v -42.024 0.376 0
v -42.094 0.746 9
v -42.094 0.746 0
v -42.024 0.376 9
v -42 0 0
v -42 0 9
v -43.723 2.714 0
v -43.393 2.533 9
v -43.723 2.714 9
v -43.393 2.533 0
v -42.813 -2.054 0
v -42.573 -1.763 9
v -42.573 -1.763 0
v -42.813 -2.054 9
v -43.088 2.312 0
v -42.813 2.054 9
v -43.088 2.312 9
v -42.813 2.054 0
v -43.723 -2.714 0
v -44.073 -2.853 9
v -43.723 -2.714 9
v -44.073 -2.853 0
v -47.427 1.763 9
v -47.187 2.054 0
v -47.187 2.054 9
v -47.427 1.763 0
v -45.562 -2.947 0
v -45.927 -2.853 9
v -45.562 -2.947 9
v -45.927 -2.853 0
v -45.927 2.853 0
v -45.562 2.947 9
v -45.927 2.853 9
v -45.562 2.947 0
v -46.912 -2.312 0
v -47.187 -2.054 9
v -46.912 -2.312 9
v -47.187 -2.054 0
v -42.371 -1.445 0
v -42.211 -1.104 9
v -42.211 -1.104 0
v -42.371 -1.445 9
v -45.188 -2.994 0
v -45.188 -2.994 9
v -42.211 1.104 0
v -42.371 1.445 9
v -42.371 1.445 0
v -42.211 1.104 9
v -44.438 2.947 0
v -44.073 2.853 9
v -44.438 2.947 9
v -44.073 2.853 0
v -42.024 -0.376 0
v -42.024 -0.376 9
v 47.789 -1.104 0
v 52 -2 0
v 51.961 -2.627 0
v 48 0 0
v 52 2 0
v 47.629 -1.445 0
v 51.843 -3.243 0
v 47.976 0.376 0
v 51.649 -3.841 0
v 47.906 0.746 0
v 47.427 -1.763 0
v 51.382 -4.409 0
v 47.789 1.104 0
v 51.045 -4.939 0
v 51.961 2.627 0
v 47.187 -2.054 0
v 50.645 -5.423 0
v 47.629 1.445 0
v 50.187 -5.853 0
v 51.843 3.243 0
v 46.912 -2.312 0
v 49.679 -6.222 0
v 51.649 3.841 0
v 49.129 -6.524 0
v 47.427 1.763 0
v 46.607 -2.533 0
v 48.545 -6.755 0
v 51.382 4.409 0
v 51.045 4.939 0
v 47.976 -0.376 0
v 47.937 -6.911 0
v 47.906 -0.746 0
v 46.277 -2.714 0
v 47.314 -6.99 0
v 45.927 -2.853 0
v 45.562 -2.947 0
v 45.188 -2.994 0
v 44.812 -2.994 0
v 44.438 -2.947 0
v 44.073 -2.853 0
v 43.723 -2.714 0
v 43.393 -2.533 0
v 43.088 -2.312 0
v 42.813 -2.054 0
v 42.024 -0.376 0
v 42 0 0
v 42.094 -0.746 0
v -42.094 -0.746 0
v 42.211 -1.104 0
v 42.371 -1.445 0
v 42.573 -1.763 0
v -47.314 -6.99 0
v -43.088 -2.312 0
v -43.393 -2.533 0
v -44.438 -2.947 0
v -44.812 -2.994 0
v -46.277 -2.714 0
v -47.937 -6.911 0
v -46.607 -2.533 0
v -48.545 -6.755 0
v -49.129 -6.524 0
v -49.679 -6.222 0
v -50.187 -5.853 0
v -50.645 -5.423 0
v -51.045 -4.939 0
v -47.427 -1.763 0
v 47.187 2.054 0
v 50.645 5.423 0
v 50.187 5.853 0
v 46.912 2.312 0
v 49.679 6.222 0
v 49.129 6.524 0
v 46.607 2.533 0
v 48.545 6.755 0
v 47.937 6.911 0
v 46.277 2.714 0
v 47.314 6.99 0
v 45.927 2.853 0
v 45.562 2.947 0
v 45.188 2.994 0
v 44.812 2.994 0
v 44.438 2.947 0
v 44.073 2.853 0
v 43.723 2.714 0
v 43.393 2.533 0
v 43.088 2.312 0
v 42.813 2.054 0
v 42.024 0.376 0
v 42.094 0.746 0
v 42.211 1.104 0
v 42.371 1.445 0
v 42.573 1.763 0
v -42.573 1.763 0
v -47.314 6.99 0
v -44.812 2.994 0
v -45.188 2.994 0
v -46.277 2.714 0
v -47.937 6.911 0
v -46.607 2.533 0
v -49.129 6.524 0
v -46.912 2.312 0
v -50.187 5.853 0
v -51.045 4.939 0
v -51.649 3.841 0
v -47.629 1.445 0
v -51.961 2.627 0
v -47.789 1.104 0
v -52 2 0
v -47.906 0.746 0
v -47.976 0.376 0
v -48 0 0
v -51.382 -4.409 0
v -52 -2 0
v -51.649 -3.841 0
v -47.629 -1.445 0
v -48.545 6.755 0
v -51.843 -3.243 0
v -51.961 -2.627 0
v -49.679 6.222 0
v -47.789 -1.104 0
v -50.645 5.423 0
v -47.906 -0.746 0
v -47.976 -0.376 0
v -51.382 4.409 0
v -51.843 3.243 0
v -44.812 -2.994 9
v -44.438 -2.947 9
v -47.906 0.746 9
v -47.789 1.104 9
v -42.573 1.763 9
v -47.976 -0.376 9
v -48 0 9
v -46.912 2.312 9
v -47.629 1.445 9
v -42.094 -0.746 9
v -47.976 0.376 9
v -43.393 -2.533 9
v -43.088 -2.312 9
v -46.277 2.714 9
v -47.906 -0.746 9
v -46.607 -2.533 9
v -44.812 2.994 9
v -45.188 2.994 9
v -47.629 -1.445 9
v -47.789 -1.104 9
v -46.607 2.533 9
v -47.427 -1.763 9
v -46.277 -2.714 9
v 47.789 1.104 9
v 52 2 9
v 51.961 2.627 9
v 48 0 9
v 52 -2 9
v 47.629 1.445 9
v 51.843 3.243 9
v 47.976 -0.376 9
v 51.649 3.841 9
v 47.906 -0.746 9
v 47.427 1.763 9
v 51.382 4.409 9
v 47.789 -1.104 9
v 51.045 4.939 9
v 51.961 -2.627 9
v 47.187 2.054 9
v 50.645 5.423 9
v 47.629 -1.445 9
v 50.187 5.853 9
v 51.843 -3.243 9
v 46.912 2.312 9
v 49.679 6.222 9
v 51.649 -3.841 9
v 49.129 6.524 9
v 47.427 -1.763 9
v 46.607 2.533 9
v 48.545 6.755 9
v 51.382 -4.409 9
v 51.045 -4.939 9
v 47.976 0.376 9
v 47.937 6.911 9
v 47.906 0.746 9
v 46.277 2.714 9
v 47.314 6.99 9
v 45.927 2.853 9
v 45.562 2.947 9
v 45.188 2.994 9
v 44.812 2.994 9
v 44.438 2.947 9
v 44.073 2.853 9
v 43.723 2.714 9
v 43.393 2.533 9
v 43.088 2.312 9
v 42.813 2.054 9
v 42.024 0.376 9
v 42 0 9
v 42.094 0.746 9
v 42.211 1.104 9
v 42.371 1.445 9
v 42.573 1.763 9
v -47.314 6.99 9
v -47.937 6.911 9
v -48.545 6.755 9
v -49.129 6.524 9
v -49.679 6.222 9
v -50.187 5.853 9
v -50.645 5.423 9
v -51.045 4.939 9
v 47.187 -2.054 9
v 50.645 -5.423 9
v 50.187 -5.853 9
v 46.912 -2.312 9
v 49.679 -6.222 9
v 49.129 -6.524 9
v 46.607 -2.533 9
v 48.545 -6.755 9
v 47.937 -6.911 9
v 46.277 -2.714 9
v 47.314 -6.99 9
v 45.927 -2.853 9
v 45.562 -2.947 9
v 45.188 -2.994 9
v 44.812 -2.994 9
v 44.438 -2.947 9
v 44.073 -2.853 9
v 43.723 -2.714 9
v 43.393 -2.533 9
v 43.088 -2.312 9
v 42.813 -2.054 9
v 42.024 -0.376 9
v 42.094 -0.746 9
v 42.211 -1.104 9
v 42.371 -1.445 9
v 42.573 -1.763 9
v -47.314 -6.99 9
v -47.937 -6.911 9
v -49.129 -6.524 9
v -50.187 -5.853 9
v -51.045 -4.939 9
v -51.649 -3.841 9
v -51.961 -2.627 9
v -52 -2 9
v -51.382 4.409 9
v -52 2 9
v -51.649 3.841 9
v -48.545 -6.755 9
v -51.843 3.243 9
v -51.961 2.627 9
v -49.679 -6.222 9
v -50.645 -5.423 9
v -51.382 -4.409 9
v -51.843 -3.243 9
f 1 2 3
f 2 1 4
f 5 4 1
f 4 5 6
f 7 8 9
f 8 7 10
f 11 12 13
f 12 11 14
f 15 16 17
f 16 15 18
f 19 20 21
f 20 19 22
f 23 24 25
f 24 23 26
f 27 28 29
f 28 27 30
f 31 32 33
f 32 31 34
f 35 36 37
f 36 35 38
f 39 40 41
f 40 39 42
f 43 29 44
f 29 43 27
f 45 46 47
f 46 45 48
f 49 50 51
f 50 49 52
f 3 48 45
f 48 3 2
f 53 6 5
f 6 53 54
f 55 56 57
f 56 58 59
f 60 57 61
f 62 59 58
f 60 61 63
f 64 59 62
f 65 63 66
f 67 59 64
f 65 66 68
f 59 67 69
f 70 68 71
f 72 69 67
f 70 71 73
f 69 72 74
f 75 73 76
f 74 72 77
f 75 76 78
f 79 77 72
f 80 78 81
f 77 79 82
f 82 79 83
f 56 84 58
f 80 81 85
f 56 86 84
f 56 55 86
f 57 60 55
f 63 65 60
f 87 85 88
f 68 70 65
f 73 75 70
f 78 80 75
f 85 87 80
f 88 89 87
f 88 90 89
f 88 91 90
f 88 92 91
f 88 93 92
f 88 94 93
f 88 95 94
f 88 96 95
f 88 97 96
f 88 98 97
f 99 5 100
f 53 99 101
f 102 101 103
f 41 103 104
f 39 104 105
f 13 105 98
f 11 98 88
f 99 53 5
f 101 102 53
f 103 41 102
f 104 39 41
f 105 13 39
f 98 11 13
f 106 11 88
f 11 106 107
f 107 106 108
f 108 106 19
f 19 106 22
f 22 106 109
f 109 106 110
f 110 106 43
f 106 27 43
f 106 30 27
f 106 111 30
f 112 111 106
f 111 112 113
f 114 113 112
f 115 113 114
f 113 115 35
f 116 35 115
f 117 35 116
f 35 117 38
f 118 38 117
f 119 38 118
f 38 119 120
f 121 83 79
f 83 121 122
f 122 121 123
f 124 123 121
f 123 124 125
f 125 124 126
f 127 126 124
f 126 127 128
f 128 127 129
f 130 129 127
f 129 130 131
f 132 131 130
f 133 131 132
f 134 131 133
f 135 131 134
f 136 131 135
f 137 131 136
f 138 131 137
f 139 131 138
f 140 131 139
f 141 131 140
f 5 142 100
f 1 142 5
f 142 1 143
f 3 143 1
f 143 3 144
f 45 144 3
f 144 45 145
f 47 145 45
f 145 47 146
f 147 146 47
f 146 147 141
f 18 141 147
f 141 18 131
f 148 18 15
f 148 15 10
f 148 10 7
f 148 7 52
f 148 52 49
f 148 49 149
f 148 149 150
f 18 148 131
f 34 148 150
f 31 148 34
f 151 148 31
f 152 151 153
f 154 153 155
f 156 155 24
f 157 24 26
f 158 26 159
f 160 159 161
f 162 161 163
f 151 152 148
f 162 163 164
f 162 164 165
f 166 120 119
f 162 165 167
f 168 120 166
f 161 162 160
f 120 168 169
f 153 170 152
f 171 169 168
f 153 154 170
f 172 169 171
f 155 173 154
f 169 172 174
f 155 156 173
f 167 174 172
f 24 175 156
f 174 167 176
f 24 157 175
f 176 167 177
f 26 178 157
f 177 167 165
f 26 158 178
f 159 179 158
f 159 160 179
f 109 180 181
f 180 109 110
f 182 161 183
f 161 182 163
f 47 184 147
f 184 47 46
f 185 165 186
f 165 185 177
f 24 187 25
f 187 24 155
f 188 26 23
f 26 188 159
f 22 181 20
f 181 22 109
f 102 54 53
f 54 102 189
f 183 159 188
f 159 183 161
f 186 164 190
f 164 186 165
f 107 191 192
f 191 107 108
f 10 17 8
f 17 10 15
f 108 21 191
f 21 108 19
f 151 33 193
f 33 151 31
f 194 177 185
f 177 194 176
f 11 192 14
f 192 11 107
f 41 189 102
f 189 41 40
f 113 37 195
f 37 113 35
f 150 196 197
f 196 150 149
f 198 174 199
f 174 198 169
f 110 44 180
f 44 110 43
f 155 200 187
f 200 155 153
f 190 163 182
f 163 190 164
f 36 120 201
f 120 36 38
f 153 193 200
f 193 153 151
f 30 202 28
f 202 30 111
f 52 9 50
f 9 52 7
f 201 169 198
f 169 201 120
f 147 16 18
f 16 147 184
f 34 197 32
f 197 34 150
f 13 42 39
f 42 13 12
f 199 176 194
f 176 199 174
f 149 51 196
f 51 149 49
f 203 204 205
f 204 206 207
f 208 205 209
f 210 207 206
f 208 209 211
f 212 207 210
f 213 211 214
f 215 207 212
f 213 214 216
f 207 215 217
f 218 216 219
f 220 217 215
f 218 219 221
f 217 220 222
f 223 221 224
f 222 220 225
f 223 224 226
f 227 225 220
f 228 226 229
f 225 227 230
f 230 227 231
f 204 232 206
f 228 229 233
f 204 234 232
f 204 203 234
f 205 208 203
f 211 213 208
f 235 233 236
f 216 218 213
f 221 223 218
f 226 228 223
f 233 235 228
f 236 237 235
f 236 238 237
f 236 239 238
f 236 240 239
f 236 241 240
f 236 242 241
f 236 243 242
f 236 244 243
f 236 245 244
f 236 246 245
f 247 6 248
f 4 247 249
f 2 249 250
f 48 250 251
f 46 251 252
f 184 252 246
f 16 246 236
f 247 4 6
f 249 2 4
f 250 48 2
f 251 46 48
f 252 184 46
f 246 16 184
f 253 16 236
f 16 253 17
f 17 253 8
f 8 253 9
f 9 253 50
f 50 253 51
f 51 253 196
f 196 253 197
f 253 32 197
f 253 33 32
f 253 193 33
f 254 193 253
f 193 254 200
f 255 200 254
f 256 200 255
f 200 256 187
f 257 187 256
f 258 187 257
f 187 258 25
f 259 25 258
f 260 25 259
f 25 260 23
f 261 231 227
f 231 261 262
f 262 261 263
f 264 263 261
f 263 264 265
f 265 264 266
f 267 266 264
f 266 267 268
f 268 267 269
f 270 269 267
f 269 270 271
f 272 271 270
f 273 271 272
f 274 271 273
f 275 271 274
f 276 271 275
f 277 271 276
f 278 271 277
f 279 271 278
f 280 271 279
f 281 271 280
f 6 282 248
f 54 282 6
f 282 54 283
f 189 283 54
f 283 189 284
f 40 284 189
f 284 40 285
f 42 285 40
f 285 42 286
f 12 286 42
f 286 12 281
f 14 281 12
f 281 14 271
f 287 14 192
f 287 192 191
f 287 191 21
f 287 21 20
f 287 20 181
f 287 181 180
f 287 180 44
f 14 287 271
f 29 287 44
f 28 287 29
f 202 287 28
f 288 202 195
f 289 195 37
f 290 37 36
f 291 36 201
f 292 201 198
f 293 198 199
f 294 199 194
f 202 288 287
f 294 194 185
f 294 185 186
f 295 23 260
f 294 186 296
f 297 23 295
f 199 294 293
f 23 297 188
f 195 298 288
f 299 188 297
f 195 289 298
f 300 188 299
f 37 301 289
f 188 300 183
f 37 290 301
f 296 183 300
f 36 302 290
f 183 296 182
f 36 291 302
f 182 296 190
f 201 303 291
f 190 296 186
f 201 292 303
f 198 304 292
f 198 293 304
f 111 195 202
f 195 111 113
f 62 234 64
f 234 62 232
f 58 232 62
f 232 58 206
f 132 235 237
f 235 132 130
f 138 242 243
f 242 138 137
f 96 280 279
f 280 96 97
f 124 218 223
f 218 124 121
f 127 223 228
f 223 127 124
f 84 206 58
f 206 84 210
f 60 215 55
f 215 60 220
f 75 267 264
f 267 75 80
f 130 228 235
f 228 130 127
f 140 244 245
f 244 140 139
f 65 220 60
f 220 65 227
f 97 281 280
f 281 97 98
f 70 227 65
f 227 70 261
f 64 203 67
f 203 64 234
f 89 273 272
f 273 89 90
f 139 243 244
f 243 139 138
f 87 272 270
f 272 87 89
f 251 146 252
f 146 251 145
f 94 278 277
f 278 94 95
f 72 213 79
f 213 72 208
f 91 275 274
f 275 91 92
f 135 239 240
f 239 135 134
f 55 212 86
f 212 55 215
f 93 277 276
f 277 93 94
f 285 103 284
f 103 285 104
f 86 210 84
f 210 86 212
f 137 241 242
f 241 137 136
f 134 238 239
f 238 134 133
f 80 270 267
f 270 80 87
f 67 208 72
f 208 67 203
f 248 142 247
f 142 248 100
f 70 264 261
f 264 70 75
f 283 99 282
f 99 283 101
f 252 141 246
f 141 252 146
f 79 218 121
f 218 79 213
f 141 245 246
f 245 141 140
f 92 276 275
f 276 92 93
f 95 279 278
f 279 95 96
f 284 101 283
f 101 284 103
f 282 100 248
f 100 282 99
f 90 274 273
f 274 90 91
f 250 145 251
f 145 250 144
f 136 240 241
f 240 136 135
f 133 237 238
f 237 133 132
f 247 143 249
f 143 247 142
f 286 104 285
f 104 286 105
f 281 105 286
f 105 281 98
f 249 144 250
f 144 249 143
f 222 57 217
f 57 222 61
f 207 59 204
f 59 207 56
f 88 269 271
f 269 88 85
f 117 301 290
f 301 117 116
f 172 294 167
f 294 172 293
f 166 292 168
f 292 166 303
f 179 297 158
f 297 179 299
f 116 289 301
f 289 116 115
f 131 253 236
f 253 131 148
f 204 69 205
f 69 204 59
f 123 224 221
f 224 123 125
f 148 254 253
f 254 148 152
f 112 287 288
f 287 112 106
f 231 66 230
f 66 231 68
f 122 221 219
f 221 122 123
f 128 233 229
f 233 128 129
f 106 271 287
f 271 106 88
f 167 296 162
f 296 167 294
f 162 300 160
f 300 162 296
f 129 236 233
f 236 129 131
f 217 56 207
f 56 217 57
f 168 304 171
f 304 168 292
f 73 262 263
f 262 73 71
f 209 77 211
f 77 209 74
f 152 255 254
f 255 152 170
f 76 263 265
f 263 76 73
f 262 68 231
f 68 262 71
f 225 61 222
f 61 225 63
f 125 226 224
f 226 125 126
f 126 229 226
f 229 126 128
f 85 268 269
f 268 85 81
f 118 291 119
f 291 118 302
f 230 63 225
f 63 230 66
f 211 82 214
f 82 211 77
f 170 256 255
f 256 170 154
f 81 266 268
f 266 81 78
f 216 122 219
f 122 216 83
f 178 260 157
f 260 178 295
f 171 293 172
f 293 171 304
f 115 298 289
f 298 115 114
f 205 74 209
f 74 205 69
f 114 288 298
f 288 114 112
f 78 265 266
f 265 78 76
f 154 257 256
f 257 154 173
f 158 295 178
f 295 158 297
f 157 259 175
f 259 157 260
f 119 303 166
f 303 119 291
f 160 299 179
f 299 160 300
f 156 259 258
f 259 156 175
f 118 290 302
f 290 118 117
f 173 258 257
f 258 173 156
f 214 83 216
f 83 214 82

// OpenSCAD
$fn = 50;


difference() {
	union() {
		hull() {
			translate(v = [-47.0000000000, 2.0000000000, 0]) {
				cylinder(h = 9, r = 5);
			}
			translate(v = [47.0000000000, 2.0000000000, 0]) {
				cylinder(h = 9, r = 5);
			}
			translate(v = [-47.0000000000, -2.0000000000, 0]) {
				cylinder(h = 9, r = 5);
			}
			translate(v = [47.0000000000, -2.0000000000, 0]) {
				cylinder(h = 9, r = 5);
			}
		}
	}
	union() {
		translate(v = [-45.0000000000, 0.0000000000, 0]) {
			cylinder(h = 9, r = 3.0000000000);
		}
		translate(v = [45.0000000000, 0.0000000000, 0]) {
			cylinder(h = 9, r = 3.0000000000);
		}
		translate(v = [-45.0000000000, 0.0000000000, 0]) {
			cylinder(h = 9, r = 1.5000000000);
		}
		translate(v = [45.0000000000, 0.0000000000, 0]) {
			cylinder(h = 9, r = 1.5000000000);
		}
		translate(v = [-45.0000000000, 0.0000000000, 0]) {
			cylinder(h = 9, r = 1.5000000000);
		}
		translate(v = [45.0000000000, 0.0000000000, 0]) {
			cylinder(h = 9, r = 1.5000000000);
		}
		translate(v = [-45.0000000000, 0.0000000000, 0]) {
			cylinder(h = 9, r = 1.5000000000);
		}
		translate(v = [45.0000000000, 0.0000000000, 0]) {
			cylinder(h = 9, r = 1.5000000000);
		}
	}
}
